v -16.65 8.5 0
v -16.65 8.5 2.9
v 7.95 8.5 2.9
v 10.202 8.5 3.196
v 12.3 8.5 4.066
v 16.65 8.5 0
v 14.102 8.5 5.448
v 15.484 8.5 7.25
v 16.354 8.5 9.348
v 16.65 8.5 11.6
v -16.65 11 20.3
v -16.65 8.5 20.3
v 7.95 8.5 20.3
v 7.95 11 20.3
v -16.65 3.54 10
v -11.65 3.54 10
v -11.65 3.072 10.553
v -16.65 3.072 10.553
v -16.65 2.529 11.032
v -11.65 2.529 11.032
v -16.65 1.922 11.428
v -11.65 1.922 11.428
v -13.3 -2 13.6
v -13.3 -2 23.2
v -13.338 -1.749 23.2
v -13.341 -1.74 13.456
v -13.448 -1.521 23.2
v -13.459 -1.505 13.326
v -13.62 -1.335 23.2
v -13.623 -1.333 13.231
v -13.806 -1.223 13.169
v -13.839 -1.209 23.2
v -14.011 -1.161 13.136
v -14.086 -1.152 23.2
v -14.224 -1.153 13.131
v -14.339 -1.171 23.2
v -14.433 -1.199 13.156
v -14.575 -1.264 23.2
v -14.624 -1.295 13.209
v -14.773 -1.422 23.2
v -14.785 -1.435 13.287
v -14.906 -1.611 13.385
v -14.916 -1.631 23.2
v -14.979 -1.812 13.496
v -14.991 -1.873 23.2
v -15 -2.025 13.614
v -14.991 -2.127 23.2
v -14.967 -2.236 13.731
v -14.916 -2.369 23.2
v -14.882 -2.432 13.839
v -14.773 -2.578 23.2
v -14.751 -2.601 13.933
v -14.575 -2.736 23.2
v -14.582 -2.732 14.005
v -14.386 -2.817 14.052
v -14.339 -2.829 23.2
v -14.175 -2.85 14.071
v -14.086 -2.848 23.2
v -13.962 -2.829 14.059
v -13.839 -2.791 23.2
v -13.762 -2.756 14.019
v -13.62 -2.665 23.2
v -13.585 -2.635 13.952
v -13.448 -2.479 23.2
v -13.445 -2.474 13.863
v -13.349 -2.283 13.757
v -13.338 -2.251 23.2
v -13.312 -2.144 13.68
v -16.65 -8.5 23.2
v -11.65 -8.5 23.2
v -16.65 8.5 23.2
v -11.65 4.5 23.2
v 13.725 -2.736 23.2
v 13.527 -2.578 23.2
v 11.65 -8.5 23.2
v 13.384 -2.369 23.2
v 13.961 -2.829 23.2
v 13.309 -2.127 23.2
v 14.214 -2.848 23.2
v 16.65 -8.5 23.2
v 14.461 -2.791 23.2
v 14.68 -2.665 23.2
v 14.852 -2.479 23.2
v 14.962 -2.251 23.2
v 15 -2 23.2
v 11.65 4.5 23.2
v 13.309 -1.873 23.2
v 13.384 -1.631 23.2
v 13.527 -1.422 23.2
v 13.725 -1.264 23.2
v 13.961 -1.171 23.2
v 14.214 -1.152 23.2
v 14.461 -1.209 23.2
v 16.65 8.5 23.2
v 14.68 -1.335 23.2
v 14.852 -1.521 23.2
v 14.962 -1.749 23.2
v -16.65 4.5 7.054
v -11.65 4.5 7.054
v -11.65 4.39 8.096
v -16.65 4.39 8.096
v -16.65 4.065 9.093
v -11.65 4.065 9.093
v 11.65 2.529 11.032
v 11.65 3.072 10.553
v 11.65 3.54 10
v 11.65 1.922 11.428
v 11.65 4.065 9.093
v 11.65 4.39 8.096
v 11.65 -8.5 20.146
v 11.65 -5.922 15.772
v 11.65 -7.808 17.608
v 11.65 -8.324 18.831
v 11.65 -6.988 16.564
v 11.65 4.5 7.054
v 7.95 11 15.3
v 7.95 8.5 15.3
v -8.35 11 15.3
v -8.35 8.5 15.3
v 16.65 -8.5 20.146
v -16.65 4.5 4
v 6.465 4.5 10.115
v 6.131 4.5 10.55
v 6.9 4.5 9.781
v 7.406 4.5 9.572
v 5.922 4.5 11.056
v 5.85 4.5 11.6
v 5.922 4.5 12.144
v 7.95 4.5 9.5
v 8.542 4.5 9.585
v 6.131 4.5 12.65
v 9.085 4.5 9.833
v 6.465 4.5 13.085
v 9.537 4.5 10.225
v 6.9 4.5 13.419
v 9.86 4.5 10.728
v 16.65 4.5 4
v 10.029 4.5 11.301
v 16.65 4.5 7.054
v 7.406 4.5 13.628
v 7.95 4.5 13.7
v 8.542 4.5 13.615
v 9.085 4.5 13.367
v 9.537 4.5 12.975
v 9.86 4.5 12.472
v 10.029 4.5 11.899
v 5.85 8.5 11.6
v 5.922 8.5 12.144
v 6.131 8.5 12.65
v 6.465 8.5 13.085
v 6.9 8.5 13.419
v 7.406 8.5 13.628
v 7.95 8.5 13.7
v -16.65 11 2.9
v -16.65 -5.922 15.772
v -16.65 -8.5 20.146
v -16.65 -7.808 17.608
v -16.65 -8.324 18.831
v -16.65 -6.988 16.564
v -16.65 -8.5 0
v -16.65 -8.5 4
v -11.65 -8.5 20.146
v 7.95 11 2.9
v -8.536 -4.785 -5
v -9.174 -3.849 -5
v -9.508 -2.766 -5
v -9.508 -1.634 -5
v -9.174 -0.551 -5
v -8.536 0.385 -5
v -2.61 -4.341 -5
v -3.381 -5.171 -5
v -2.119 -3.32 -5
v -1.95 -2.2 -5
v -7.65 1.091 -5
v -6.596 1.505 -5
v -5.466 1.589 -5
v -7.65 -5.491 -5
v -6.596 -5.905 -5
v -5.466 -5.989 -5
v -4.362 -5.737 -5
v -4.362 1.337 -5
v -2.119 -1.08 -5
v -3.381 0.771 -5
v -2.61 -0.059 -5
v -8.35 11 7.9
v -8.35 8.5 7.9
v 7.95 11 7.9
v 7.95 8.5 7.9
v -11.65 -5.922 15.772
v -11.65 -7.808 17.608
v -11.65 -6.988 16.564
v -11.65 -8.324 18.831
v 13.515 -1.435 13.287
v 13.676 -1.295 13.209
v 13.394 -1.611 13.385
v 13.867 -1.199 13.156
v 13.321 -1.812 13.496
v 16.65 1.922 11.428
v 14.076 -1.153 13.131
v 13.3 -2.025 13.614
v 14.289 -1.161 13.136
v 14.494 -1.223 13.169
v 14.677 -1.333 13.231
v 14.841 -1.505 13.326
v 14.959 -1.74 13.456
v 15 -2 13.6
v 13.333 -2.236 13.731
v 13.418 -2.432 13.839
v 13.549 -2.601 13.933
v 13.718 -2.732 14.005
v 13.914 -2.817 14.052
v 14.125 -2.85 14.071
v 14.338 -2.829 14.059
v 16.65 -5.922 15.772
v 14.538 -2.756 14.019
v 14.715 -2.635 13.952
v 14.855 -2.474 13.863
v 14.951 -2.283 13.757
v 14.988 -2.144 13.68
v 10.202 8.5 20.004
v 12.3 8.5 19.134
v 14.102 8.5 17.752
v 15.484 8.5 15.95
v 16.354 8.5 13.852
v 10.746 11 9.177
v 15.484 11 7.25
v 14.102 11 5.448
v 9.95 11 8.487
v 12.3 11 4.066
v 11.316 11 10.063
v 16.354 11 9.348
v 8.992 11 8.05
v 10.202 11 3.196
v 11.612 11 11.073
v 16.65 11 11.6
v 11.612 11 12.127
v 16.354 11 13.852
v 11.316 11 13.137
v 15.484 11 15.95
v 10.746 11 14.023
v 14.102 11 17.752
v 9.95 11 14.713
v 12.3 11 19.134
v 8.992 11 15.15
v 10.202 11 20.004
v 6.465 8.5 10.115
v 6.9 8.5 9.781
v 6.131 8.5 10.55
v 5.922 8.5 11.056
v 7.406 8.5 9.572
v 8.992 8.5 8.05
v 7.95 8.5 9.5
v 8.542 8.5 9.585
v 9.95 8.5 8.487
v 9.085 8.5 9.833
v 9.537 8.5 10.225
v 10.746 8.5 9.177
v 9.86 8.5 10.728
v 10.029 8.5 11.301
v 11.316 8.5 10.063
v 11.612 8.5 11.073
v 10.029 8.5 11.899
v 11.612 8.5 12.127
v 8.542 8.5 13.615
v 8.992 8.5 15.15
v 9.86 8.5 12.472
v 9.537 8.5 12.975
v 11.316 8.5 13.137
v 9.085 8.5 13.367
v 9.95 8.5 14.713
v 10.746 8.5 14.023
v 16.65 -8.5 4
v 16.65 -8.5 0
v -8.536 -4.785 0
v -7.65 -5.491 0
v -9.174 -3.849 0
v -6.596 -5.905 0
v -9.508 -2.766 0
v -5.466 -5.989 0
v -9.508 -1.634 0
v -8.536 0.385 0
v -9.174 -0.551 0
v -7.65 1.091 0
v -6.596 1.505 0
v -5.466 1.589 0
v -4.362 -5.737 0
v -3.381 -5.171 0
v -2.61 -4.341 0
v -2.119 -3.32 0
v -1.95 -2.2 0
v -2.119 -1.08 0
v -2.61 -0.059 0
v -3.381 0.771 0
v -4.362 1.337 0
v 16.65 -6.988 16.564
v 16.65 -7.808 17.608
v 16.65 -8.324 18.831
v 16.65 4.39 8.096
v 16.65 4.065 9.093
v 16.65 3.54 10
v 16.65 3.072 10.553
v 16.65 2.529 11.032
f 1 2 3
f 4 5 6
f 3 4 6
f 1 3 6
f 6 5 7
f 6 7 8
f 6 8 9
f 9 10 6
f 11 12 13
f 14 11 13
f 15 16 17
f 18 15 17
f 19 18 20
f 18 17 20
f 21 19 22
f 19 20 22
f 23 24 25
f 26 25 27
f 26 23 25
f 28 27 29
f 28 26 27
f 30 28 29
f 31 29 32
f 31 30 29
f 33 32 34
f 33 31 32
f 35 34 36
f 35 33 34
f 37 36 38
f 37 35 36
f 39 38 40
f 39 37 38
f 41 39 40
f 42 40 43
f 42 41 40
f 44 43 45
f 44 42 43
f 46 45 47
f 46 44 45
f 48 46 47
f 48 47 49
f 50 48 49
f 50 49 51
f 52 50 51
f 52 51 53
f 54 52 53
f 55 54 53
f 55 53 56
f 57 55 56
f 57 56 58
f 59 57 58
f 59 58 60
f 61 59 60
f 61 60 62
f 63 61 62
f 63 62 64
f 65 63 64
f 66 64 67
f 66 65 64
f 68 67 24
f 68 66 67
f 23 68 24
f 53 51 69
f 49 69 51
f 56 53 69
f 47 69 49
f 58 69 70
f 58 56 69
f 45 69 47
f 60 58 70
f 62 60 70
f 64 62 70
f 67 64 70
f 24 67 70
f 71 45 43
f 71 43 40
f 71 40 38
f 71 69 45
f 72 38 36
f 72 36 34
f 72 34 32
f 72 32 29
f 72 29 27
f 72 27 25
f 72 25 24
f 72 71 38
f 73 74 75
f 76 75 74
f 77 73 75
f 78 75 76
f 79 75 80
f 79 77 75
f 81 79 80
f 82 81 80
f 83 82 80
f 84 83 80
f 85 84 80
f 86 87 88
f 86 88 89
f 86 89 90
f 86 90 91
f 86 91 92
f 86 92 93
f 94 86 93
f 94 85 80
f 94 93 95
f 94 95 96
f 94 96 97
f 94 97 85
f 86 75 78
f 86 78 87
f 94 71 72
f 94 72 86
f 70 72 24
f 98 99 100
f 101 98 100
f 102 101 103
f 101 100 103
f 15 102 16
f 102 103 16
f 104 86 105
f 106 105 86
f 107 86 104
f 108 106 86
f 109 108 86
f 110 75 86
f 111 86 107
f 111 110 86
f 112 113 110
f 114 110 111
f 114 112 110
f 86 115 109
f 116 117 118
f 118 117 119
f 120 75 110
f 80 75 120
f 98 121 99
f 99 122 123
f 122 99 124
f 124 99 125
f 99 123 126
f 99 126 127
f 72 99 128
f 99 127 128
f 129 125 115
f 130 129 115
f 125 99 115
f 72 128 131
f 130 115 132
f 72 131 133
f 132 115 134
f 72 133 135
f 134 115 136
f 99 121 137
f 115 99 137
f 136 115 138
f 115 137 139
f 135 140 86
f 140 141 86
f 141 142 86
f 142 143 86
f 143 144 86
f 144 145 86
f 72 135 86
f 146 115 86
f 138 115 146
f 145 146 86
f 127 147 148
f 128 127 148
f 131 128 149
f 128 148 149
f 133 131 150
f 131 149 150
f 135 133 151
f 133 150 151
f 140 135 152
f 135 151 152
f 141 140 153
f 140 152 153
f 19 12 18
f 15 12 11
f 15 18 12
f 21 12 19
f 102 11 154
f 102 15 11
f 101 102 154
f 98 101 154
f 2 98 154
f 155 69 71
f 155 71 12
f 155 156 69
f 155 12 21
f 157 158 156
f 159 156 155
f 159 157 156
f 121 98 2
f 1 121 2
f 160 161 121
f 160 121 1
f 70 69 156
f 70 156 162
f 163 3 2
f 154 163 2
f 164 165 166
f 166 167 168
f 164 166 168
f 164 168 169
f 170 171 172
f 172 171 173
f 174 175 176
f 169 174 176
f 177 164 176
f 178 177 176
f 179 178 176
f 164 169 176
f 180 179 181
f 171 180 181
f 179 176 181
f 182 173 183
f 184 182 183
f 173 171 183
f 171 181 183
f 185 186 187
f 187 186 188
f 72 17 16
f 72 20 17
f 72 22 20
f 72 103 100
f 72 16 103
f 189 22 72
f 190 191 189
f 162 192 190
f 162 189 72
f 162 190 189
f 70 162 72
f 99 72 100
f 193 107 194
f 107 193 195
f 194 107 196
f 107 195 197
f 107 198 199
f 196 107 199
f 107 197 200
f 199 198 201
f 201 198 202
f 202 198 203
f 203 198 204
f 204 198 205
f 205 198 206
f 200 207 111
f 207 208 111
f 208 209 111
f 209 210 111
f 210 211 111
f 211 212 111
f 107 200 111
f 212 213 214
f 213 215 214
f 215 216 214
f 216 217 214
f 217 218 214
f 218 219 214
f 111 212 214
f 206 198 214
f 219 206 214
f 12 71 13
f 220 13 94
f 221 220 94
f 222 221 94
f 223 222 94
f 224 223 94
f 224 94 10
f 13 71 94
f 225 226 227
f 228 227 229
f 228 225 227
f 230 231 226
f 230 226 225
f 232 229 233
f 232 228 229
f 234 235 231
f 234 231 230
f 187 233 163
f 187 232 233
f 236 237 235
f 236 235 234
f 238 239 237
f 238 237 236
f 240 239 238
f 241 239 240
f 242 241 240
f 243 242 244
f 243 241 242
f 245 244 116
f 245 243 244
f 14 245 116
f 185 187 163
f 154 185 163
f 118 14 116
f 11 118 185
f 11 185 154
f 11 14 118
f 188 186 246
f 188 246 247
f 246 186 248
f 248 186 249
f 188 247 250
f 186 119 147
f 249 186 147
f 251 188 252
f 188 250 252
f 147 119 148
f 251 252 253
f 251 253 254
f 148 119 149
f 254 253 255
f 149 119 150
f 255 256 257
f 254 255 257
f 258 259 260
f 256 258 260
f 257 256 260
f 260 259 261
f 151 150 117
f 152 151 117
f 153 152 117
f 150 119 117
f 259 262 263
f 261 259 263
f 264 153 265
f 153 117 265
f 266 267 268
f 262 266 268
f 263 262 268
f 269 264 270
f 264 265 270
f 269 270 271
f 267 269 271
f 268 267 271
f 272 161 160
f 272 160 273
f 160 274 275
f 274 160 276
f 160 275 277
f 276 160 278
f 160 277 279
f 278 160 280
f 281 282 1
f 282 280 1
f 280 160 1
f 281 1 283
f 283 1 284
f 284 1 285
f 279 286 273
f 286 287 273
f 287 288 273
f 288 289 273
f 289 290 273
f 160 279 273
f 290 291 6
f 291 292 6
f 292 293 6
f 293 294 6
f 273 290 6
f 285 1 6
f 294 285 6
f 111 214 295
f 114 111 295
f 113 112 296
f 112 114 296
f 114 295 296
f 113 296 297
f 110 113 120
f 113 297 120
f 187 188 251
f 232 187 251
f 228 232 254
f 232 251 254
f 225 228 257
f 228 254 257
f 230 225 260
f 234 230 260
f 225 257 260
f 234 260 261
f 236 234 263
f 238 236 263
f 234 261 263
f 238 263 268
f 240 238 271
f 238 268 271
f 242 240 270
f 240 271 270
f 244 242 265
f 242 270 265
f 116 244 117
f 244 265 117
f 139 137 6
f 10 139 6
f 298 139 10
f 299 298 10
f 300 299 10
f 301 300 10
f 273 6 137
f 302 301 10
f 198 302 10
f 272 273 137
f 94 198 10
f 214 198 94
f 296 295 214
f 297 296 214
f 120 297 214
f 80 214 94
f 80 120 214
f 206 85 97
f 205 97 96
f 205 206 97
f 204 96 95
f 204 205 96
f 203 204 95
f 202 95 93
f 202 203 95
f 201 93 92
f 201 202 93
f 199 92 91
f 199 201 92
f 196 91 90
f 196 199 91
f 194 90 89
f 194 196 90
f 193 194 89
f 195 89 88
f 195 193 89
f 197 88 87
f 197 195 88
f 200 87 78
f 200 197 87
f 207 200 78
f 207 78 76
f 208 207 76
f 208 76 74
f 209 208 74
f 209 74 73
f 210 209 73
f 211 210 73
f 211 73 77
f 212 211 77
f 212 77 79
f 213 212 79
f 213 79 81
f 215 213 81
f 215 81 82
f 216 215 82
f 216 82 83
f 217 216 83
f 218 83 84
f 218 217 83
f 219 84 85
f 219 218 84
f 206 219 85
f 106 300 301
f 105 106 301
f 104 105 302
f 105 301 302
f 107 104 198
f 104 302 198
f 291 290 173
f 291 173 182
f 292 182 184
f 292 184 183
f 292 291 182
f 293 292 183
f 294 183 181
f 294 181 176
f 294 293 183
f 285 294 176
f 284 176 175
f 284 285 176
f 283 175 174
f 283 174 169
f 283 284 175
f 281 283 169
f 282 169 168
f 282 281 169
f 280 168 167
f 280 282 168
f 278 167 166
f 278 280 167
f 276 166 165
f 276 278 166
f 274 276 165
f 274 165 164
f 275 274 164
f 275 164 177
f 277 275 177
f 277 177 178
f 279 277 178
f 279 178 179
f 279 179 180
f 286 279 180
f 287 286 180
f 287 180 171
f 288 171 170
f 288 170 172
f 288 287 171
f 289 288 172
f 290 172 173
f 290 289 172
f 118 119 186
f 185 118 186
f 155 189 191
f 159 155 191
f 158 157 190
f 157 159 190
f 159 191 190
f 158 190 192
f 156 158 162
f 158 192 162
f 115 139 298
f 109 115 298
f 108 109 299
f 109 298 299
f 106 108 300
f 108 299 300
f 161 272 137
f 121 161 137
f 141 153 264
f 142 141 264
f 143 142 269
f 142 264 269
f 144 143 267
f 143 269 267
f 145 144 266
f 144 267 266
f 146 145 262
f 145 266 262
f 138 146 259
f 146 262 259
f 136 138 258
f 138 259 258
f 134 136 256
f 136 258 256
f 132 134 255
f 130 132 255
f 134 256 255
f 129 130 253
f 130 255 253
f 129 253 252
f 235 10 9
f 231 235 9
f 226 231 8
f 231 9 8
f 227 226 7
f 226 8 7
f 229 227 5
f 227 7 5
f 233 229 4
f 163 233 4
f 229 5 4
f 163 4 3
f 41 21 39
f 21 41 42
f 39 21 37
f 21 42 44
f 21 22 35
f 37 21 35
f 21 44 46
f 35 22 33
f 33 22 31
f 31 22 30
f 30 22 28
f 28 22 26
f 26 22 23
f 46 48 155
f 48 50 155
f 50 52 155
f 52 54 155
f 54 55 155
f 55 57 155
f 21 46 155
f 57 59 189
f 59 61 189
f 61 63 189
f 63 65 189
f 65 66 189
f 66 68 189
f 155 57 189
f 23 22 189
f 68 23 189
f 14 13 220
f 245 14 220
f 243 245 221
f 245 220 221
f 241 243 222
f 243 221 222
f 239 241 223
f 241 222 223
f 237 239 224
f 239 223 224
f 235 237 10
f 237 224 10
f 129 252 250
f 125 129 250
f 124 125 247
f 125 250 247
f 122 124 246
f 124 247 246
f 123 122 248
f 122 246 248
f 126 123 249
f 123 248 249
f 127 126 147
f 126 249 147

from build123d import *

# Parameters (mm, degrees)
F1_W      = 5
F1_H      = 7.2
F1_H_2    = 6
F1_H_3    = 4
F1_W_2    = 23.3
F3_DEPTH  = 8.5
F0_W      = 23.3
F0_H      = 4
F4_DEPTH  = 23.2
F5_DEPTH  = 18.1
F6_START  = 4.3
F0_R      = 0.85
F6_DEPTH  = 20.7
F0_R_2    = 3.8
F7_DEPTH  = 5
F9_DEPTH  = 2.5
F10_DEPTH = 27.6


with BuildPart() as f3:
    # F1 (on Front) → F3 (new body, symmetric)
    with BuildSketch(Plane.XZ):
        with Locations((-14.15, 13.6)):
            Rectangle(F1_W, F1_H)
        with Locations((-14.15, 20.2)):
            Rectangle(F1_W, F1_H_2)
        with Locations((-14.15, 7)):
            Rectangle(F1_W, F1_H_2)
        with Locations((-14.15, 2)):
            Rectangle(F1_W, F1_H_3)
        with Locations((0, 2)):
            Rectangle(F1_W_2, F1_H_3)
        with Locations((14.15, 2)):
            Rectangle(F1_W, F1_H_3)
        with Locations((14.15, 7)):
            Rectangle(F1_W, F1_H_2)
        with Locations((14.15, 13.6)):
            Rectangle(F1_W, F1_H)
        with Locations((14.15, 20.2)):
            Rectangle(F1_W, F1_H_2)
    extrude(amount=F3_DEPTH, both=True)

    # F0 (on Top) → F4 (join)
    with BuildSketch(Plane.XY):
        with Locations((0, 6.5)):
            Rectangle(F0_W, F0_H)
    extrude(amount=F4_DEPTH)

    # F2 (on Right) → F5 (cut, symmetric)
    with BuildSketch(Plane.YZ):
        with BuildLine():
            Line((-8.5, 17.2), (-8.5, 10))
            Line((-8.5, 10), (3.5396314061, 10))
            ThreePointArc((3.5396314061, 10), (2.8089650426, 10.8020152096), (1.9224991399, 11.4275389379))
            Line((1.9224991399, 11.4275389379), (-5.9224991399, 15.7724610621))
            ThreePointArc((-5.9224991399, 15.7724610621), (-6.8089650426, 16.3979847904), (-7.5396314061, 17.2))
            Line((-7.5396314061, 17.2), (-8.5, 17.2))
        make_face()
        with BuildLine():
            Line((-8.5, 20.1464178425), (-8.5, 17.2))
            Line((-8.5, 17.2), (-7.5396314061, 17.2))
            ThreePointArc((-7.5396314061, 17.2), (-8.2538488107, 18.5969271247), (-8.5, 20.1464178425))
        make_face()
        with BuildLine():
            Line((-8.5, 10), (-8.5, 4))
            Line((-8.5, 4), (4.5, 4))
            Line((4.5, 4), (4.5, 7.0535821575))
            ThreePointArc((4.5, 7.0535821575), (4.2538488107, 8.6030728753), (3.5396314061, 10))
            Line((3.5396314061, 10), (-8.5, 10))
        make_face()
    extrude(amount=F5_DEPTH, both=True, mode=Mode.SUBTRACT)

    # F0 (on Top) → F6 (cut)
    with BuildSketch(Plane.XY.offset(F6_START)):
        with Locations((14.15, -2)):
            Circle(F0_R)
        with Locations((-14.15, -2)):
            Circle(F0_R)
    extrude(amount=F6_DEPTH, mode=Mode.SUBTRACT)

    # F0 (on Top) → F7 (join)
    with BuildSketch(Plane.XY):
        with Locations((-5.75, -2.2)):
            Circle(F0_R_2)
    extrude(amount=-F7_DEPTH)

    # F8 (on face) → F9 (join)
    with BuildSketch(Plane(origin=(0, 8.5, 0), x_dir=(-1, 0, 0), z_dir=(0, 1, 0))):
        with BuildLine():
            ThreePointArc((-7.95, 20.3), (-14.1018289963, 17.7518289963), (-16.65, 11.6))
            ThreePointArc((-16.65, 11.6), (-14.1018289963, 5.4481710037), (-7.95, 2.9))
            ThreePointArc((-7.95, 2.9), (-3.2863104735, 4.2556143892), (-0.075992126, 7.9))
            Line((-0.075992126, 7.9), (-7.95, 7.9))
            ThreePointArc((-7.95, 7.9), (-11.65, 11.6), (-7.95, 15.3))
            Line((-7.95, 15.3), (-0.075992126, 15.3))
            ThreePointArc((-0.075992126, 15.3), (-3.2863104735, 18.9443856108), (-7.95, 20.3))
        make_face()
        with BuildLine():
            Line((-7.95, 2.9), (16.65, 2.9))
            Line((16.65, 2.9), (16.65, 20.3))
            Line((16.65, 20.3), (-7.95, 20.3))
            ThreePointArc((-7.95, 20.3), (-3.2863104735, 18.9443856108), (-0.075992126, 15.3))
            Line((-0.075992126, 15.3), (8.35, 15.3))
            Line((8.35, 15.3), (8.35, 7.9))
            Line((8.35, 7.9), (-0.075992126, 7.9))
            ThreePointArc((-0.075992126, 7.9), (-3.2863104735, 4.2556143892), (-7.95, 2.9))
        make_face()
    extrude(amount=F9_DEPTH)

    # F8 (on face) → F10 (cut)
    with BuildSketch(Plane(origin=(0, 8.5, 0), x_dir=(-1, 0, 0), z_dir=(0, 1, 0))):
        with BuildLine():
            ThreePointArc((-5.85, 11.6), (-6.4650757595, 13.0849242405), (-7.95, 13.7))
            Line((-7.95, 13.7), (-7.95, 9.5))
            ThreePointArc((-7.95, 9.5), (-6.4650757595, 10.1150757595), (-5.85, 11.6))
        make_face()
        with BuildLine():
            Line((-7.95, 9.5), (-7.95, 13.7))
            ThreePointArc((-7.95, 13.7), (-10.05, 11.6), (-7.95, 9.5))
        make_face()
    extrude(amount=-F10_DEPTH, mode=Mode.SUBTRACT)


solid = f3.part
